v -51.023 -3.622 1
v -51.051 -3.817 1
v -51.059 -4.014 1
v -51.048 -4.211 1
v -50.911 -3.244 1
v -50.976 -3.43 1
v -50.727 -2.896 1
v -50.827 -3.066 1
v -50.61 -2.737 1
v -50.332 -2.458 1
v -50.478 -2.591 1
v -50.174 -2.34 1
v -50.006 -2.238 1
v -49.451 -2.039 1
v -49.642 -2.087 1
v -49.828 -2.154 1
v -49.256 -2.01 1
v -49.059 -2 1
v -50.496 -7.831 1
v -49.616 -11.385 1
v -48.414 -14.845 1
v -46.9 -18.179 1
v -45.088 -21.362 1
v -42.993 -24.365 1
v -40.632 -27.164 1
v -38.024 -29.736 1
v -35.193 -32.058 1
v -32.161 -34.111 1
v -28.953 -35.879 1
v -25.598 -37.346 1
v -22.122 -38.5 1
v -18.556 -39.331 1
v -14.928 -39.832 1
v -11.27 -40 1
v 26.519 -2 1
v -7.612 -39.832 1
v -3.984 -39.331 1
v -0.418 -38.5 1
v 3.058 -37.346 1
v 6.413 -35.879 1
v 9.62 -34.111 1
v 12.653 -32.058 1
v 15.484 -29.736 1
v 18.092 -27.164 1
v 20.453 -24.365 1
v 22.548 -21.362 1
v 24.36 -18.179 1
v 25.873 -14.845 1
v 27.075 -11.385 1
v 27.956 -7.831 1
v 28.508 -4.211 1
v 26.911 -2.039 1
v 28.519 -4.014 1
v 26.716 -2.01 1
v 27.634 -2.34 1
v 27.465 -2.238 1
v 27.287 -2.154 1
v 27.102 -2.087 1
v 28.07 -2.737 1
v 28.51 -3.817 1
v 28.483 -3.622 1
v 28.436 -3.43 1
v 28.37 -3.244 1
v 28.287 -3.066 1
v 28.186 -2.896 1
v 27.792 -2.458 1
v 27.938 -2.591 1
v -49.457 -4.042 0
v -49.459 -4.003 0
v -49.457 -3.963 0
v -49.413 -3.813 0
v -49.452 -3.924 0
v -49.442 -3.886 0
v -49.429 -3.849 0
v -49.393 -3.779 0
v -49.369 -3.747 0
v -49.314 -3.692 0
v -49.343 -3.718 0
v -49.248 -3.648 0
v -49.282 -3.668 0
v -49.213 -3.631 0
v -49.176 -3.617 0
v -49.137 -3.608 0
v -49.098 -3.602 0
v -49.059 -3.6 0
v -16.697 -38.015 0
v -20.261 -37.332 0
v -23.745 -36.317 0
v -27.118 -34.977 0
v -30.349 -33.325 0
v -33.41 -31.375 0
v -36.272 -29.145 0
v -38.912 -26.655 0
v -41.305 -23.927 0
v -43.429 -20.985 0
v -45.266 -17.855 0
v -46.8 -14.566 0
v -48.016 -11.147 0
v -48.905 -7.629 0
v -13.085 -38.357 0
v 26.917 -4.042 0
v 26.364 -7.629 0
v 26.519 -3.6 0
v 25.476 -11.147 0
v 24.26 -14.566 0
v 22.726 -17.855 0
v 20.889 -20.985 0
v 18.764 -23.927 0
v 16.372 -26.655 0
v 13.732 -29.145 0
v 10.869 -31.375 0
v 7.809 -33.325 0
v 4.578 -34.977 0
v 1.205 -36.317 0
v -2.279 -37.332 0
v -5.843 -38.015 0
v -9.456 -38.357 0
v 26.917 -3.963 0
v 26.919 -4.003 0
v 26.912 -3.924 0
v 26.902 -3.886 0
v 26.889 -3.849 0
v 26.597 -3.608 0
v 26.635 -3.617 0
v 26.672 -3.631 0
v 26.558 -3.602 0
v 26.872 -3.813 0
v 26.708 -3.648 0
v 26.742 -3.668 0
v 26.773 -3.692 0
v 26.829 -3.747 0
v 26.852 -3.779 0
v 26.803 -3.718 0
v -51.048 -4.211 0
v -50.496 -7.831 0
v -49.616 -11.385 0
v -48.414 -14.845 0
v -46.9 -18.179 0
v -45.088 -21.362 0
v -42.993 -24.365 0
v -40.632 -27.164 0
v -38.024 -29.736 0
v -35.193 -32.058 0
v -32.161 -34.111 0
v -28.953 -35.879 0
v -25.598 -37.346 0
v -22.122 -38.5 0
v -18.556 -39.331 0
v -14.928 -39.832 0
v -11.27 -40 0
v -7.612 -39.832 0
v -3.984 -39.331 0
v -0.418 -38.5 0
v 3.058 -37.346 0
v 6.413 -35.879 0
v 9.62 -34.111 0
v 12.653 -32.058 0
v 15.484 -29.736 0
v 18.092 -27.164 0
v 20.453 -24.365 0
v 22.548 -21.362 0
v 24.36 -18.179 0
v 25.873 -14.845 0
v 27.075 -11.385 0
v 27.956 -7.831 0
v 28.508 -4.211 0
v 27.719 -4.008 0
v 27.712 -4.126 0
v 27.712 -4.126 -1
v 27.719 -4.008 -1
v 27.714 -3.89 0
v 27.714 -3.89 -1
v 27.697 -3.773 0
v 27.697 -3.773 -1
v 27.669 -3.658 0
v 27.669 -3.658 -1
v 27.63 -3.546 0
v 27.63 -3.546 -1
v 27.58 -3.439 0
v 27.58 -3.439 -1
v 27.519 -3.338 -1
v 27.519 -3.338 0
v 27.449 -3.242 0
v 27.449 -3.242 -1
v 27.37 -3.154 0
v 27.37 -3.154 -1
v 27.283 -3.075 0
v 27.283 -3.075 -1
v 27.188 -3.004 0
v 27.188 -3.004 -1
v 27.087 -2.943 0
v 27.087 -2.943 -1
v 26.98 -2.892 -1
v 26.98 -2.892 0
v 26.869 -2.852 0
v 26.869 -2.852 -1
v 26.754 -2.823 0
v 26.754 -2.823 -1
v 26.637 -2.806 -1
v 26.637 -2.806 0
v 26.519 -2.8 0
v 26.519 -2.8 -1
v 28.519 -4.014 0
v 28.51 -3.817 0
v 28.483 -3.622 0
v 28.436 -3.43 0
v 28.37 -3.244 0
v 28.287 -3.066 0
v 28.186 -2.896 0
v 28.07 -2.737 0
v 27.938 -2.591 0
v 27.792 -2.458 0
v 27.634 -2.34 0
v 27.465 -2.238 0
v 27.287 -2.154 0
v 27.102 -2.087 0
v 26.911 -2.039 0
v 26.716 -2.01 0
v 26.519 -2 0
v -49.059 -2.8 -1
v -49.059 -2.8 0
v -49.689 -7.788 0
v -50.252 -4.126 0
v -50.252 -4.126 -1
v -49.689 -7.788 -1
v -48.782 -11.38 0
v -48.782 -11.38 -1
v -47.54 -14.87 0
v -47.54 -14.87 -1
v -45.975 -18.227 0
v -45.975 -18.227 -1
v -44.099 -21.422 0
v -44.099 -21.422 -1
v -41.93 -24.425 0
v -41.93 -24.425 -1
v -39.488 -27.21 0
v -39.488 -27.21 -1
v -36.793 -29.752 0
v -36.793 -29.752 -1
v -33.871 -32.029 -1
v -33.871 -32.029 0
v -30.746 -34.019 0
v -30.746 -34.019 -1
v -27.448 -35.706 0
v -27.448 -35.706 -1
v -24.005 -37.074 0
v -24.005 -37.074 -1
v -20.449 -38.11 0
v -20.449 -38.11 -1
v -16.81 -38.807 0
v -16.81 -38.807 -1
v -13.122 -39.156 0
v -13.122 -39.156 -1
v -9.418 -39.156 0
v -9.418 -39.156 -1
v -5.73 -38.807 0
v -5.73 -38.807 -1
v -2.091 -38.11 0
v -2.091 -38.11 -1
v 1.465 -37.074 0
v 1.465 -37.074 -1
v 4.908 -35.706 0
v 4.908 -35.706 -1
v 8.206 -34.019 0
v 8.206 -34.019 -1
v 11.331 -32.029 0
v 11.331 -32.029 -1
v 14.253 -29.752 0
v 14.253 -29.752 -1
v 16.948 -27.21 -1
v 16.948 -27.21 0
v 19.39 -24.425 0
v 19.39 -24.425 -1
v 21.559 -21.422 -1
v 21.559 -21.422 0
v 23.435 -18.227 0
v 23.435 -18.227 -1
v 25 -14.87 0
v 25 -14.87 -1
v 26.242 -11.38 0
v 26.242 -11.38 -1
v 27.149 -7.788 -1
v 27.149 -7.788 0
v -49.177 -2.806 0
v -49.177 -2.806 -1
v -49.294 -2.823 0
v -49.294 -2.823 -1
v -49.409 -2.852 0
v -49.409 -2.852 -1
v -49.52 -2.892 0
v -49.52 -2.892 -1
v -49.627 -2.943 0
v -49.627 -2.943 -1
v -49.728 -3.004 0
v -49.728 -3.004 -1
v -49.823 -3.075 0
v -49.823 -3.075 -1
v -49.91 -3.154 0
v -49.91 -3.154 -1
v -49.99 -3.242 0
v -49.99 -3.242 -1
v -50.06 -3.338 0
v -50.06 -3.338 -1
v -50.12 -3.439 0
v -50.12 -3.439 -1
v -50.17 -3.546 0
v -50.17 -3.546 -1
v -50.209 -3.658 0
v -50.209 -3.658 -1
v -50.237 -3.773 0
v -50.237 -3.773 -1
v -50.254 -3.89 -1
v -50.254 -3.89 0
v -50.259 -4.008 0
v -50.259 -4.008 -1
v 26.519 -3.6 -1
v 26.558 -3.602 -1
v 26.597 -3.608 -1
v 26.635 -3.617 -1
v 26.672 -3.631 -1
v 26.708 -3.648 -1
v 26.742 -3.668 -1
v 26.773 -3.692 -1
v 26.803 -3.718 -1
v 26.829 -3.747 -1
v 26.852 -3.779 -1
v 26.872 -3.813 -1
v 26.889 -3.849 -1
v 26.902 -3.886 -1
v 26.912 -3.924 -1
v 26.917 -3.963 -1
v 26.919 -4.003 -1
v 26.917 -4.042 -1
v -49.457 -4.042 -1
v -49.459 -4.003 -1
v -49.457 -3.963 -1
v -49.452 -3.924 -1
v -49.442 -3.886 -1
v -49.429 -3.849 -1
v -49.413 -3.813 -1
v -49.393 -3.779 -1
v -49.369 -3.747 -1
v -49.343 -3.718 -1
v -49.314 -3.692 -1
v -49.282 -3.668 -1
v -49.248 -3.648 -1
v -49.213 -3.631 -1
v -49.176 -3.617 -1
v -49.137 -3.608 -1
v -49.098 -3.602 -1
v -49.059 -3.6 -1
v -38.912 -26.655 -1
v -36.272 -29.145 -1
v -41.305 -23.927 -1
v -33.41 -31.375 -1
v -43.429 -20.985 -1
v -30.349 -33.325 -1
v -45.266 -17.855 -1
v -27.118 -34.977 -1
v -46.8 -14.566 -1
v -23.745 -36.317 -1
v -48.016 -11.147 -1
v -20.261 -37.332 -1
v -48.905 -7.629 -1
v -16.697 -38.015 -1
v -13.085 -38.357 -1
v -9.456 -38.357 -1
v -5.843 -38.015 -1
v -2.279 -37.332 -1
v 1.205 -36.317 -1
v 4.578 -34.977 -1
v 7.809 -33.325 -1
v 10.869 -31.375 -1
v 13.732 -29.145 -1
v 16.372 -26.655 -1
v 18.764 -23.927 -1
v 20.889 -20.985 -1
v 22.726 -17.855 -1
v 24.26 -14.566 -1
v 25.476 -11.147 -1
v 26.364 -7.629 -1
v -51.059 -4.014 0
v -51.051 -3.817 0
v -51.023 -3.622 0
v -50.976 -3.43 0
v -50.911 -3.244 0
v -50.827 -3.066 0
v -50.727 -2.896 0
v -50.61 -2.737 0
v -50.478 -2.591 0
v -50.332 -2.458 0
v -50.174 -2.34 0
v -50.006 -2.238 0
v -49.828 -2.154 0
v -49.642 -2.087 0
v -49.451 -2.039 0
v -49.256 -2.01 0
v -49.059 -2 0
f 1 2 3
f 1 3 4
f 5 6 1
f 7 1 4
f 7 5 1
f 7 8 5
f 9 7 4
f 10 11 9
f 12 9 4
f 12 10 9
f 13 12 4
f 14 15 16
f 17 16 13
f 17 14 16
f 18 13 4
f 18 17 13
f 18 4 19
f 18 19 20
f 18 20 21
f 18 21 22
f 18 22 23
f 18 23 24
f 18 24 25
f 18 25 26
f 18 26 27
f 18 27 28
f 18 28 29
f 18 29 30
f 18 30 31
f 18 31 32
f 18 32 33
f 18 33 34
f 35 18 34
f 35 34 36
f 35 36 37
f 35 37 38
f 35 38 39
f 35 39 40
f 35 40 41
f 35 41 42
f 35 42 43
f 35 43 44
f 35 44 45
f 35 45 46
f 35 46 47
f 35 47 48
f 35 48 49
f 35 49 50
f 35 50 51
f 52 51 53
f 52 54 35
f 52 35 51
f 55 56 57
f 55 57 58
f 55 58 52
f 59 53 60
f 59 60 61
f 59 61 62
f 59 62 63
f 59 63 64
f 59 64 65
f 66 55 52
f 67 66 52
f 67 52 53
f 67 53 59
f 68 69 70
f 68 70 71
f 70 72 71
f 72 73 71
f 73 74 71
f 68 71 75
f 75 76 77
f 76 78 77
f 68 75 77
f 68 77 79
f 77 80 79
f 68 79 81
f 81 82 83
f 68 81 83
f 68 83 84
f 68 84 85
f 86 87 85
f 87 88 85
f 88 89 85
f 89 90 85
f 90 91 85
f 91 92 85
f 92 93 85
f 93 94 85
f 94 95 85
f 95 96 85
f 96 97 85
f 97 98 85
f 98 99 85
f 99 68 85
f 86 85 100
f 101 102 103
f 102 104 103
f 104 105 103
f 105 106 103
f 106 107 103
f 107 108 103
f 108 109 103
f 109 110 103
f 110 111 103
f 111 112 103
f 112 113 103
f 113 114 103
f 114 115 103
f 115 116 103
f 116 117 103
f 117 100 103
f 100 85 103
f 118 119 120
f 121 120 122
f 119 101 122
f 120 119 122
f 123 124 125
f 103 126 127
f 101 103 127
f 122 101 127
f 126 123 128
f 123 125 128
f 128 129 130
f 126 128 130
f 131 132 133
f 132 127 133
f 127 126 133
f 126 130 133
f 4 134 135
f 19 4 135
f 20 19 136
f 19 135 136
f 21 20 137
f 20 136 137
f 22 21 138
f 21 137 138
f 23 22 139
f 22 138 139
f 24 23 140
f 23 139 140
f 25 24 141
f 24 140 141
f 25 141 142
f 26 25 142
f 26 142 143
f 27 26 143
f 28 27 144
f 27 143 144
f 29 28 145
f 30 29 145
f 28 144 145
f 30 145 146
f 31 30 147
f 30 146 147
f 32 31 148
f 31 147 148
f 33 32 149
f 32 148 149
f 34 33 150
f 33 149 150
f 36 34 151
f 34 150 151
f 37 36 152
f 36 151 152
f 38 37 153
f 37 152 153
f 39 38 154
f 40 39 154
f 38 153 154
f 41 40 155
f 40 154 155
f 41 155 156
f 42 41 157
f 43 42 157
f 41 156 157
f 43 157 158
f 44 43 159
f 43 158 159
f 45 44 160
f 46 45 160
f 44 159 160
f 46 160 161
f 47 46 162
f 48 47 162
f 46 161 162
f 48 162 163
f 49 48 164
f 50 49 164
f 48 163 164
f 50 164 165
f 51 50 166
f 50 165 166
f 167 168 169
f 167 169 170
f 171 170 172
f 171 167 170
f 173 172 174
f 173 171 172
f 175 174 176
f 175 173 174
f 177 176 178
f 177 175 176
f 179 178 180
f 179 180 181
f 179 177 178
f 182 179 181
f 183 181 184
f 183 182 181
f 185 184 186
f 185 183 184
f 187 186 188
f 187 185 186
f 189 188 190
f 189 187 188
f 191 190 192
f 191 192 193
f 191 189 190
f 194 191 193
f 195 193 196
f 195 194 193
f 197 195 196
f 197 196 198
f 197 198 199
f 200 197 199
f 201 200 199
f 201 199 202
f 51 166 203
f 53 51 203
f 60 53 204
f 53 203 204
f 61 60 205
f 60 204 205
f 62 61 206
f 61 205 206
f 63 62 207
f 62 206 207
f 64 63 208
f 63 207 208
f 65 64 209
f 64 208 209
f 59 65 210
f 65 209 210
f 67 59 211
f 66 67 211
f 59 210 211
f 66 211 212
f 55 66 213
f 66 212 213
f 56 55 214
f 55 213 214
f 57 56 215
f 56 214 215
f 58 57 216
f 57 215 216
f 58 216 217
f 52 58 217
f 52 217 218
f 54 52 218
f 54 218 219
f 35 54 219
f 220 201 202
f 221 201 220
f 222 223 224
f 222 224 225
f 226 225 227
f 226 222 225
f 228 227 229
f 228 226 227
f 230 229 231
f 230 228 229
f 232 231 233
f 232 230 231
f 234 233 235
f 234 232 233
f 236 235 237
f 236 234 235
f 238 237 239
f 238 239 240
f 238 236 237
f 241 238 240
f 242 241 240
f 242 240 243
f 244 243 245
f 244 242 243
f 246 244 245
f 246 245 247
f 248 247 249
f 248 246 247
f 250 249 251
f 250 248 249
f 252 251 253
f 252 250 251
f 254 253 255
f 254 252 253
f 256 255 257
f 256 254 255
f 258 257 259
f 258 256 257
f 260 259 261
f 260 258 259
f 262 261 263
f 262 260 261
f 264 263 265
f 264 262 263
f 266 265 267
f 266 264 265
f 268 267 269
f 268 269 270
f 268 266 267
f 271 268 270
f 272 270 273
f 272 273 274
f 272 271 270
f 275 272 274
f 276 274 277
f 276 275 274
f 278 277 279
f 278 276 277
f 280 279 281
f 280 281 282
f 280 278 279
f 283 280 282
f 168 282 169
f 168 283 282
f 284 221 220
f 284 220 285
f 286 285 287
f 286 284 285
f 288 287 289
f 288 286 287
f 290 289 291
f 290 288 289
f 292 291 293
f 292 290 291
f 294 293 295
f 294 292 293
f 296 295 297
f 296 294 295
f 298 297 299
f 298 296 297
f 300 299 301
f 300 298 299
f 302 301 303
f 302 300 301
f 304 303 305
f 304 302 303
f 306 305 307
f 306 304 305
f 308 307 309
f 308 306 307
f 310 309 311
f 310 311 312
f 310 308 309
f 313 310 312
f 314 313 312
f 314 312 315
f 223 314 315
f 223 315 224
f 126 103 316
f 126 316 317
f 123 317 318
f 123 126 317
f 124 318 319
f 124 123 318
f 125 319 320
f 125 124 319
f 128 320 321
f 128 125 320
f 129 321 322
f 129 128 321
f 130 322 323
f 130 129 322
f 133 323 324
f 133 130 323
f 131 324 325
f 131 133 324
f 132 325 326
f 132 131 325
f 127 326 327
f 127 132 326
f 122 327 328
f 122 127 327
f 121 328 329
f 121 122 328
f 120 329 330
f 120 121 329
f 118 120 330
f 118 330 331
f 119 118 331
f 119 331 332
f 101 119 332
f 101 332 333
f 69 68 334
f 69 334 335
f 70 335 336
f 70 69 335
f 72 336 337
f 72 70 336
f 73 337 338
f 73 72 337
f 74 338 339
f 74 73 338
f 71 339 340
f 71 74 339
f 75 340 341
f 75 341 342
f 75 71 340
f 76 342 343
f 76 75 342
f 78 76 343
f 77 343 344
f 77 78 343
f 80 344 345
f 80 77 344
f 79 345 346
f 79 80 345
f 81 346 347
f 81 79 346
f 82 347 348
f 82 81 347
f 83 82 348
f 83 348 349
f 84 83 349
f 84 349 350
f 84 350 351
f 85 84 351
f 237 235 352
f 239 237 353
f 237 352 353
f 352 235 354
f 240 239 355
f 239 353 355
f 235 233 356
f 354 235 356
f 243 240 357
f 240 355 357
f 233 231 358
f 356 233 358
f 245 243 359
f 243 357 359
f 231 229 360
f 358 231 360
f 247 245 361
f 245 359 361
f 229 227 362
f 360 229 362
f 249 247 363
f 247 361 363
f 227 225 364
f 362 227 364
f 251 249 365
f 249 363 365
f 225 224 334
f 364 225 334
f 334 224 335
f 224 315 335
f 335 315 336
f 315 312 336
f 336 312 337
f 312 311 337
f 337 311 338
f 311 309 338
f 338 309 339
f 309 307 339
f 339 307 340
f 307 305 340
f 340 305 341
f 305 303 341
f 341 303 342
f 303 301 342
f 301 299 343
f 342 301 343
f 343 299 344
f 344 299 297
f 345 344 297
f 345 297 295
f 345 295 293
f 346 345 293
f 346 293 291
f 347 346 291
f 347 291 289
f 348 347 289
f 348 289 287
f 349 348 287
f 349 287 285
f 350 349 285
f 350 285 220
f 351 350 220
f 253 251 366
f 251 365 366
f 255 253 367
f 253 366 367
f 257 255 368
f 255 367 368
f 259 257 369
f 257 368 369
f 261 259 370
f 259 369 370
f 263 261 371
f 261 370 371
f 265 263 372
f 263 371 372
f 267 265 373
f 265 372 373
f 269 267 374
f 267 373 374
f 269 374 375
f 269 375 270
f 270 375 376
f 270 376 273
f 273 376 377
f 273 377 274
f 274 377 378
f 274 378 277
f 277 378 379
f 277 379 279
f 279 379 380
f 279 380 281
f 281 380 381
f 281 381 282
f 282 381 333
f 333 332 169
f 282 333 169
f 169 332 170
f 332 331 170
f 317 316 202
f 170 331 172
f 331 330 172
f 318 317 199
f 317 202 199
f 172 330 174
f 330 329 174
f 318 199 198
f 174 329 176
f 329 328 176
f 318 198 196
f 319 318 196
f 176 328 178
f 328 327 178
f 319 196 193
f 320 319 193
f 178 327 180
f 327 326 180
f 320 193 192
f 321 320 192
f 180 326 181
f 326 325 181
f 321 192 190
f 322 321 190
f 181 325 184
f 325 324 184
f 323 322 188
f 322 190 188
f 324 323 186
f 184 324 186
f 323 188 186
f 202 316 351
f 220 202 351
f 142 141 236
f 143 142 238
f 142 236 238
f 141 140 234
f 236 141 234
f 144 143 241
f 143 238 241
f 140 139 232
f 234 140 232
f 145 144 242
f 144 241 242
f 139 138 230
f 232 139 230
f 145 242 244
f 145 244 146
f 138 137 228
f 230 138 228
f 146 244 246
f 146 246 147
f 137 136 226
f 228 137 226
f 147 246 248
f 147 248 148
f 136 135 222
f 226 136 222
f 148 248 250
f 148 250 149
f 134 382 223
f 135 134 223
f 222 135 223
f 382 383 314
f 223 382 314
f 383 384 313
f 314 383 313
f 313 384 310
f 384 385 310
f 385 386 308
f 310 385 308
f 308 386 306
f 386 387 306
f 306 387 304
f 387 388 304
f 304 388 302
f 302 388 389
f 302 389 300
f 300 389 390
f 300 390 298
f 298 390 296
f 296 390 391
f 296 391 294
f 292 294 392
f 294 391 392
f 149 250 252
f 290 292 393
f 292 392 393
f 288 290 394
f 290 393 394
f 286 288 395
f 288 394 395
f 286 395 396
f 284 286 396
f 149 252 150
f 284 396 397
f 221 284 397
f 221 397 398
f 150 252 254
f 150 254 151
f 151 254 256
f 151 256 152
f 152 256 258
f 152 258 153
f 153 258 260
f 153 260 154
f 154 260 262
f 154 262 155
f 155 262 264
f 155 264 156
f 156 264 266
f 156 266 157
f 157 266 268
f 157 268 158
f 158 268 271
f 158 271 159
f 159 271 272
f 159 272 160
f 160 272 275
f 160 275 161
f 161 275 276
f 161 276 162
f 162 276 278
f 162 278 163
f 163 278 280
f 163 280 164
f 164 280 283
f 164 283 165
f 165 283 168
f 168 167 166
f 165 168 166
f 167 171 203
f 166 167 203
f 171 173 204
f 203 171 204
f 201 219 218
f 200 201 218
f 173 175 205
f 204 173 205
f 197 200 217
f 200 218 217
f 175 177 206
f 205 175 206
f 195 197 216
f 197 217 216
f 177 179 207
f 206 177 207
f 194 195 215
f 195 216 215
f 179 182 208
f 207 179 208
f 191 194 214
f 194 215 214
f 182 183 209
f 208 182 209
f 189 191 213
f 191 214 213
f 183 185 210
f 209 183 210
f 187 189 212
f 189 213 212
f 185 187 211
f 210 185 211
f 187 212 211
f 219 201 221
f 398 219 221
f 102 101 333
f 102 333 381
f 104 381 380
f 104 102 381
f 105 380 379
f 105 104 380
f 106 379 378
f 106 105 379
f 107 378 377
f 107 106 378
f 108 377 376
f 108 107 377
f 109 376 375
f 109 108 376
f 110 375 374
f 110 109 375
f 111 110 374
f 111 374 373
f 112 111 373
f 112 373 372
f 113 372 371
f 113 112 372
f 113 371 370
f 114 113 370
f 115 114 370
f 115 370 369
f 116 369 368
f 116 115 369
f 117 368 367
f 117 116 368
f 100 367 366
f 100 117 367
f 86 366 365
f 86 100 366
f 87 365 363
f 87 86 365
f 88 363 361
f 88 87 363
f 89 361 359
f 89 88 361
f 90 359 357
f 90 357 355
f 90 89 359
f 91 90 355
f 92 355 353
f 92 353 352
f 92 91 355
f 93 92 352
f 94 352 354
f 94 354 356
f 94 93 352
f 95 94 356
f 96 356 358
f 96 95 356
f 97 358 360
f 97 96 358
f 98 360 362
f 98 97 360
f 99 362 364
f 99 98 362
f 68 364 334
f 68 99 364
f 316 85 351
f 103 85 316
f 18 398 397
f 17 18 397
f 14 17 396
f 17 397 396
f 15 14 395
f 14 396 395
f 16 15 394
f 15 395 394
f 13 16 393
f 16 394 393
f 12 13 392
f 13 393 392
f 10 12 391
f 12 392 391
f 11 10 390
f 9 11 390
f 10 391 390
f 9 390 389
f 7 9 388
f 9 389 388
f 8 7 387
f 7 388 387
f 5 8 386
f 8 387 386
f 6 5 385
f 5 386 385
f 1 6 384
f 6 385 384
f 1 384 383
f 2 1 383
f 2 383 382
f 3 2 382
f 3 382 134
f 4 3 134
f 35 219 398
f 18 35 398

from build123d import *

# Parameters (mm, degrees)
F1_DEPTH = 1
F2_DEPTH = 1


with BuildPart() as f1:
    # F0 (on Top) → F1 (new body)
    with BuildSketch(Plane.XY):
        with BuildLine():
            ThreePointArc((28.507673021, -4.2105263158), (28.0055681014, -2.6622878919), (26.5187842181, -2))
            Line((26.5187842181, -2), (-49.0589902927, -2))
            ThreePointArc((-49.0589902927, -2), (-50.5457741761, -2.6622878919), (-51.0478790956, -4.2105263158))
            ThreePointArc((-51.0478790956, -4.2105263158), (-11.2701030373, -40), (28.507673021, -4.2105263158))
        make_face()
        with BuildLine():
            ThreePointArc((26.5187842181, -2.7999999982), (27.4108545494, -3.1973727339), (27.7121175016, -4.1263157897))
            ThreePointArc((27.7121175016, -4.1263157897), (-11.2701030383, -39.2000000018), (-50.2523235764, -4.1263157876))
            ThreePointArc((-50.2523235764, -4.1263157876), (-49.9510606247, -3.1973727333), (-49.0589902947, -2.7999999982))
            Line((-49.0589902947, -2.7999999982), (26.5187842181, -2.7999999982))
        make_face(mode=Mode.SUBTRACT)
        with BuildLine():
            ThreePointArc((-50.2523235764, -4.1263157876), (-11.2701030383, -39.2000000018), (27.7121175016, -4.1263157897))
            ThreePointArc((27.7121175016, -4.1263157897), (27.4108545494, -3.1973727339), (26.5187842181, -2.7999999982))
            Line((26.5187842181, -2.7999999982), (-49.0589902947, -2.7999999982))
            ThreePointArc((-49.0589902947, -2.7999999982), (-49.9510606247, -3.1973727333), (-50.2523235764, -4.1263157876))
        make_face()
        with BuildLine():
            Line((-49.0589902947, -3.5999999382), (26.5187842181, -3.5999999382))
            ThreePointArc((26.5187842181, -3.5999999382), (26.8161410407, -3.732457537), (26.9165620401, -4.0421052697))
            ThreePointArc((26.9165620401, -4.0421052697), (-11.2701030383, -38.4000000618), (-49.456768115, -4.0421052677))
            ThreePointArc((-49.456768115, -4.0421052677), (-49.356347116, -3.7324575364), (-49.0589902947, -3.5999999382))
        make_face(mode=Mode.SUBTRACT)
        with BuildLine():
            ThreePointArc((26.9165620401, -4.0421052697), (26.8161410407, -3.732457537), (26.5187842181, -3.5999999382))
            Line((26.5187842181, -3.5999999382), (-49.0589902947, -3.5999999382))
            ThreePointArc((-49.0589902947, -3.5999999382), (-49.356347116, -3.7324575364), (-49.456768115, -4.0421052677))
            ThreePointArc((-49.456768115, -4.0421052677), (-11.2701030383, -38.4000000618), (26.9165620401, -4.0421052697))
        make_face()
    extrude(amount=F1_DEPTH)

    # F0 (on Top) → F2 (join)
    with BuildSketch(Plane.XY):
        with BuildLine():
            ThreePointArc((-50.2523235764, -4.1263157876), (-11.2701030383, -39.2000000018), (27.7121175016, -4.1263157897))
            ThreePointArc((27.7121175016, -4.1263157897), (27.4108545494, -3.1973727339), (26.5187842181, -2.7999999982))
            Line((26.5187842181, -2.7999999982), (-49.0589902947, -2.7999999982))
            ThreePointArc((-49.0589902947, -2.7999999982), (-49.9510606247, -3.1973727333), (-50.2523235764, -4.1263157876))
        make_face()
        with BuildLine():
            Line((-49.0589902947, -3.5999999382), (26.5187842181, -3.5999999382))
            ThreePointArc((26.5187842181, -3.5999999382), (26.8161410407, -3.732457537), (26.9165620401, -4.0421052697))
            ThreePointArc((26.9165620401, -4.0421052697), (-11.2701030383, -38.4000000618), (-49.456768115, -4.0421052677))
            ThreePointArc((-49.456768115, -4.0421052677), (-49.356347116, -3.7324575364), (-49.0589902947, -3.5999999382))
        make_face(mode=Mode.SUBTRACT)
    extrude(amount=-F2_DEPTH)


solid = f1.part
